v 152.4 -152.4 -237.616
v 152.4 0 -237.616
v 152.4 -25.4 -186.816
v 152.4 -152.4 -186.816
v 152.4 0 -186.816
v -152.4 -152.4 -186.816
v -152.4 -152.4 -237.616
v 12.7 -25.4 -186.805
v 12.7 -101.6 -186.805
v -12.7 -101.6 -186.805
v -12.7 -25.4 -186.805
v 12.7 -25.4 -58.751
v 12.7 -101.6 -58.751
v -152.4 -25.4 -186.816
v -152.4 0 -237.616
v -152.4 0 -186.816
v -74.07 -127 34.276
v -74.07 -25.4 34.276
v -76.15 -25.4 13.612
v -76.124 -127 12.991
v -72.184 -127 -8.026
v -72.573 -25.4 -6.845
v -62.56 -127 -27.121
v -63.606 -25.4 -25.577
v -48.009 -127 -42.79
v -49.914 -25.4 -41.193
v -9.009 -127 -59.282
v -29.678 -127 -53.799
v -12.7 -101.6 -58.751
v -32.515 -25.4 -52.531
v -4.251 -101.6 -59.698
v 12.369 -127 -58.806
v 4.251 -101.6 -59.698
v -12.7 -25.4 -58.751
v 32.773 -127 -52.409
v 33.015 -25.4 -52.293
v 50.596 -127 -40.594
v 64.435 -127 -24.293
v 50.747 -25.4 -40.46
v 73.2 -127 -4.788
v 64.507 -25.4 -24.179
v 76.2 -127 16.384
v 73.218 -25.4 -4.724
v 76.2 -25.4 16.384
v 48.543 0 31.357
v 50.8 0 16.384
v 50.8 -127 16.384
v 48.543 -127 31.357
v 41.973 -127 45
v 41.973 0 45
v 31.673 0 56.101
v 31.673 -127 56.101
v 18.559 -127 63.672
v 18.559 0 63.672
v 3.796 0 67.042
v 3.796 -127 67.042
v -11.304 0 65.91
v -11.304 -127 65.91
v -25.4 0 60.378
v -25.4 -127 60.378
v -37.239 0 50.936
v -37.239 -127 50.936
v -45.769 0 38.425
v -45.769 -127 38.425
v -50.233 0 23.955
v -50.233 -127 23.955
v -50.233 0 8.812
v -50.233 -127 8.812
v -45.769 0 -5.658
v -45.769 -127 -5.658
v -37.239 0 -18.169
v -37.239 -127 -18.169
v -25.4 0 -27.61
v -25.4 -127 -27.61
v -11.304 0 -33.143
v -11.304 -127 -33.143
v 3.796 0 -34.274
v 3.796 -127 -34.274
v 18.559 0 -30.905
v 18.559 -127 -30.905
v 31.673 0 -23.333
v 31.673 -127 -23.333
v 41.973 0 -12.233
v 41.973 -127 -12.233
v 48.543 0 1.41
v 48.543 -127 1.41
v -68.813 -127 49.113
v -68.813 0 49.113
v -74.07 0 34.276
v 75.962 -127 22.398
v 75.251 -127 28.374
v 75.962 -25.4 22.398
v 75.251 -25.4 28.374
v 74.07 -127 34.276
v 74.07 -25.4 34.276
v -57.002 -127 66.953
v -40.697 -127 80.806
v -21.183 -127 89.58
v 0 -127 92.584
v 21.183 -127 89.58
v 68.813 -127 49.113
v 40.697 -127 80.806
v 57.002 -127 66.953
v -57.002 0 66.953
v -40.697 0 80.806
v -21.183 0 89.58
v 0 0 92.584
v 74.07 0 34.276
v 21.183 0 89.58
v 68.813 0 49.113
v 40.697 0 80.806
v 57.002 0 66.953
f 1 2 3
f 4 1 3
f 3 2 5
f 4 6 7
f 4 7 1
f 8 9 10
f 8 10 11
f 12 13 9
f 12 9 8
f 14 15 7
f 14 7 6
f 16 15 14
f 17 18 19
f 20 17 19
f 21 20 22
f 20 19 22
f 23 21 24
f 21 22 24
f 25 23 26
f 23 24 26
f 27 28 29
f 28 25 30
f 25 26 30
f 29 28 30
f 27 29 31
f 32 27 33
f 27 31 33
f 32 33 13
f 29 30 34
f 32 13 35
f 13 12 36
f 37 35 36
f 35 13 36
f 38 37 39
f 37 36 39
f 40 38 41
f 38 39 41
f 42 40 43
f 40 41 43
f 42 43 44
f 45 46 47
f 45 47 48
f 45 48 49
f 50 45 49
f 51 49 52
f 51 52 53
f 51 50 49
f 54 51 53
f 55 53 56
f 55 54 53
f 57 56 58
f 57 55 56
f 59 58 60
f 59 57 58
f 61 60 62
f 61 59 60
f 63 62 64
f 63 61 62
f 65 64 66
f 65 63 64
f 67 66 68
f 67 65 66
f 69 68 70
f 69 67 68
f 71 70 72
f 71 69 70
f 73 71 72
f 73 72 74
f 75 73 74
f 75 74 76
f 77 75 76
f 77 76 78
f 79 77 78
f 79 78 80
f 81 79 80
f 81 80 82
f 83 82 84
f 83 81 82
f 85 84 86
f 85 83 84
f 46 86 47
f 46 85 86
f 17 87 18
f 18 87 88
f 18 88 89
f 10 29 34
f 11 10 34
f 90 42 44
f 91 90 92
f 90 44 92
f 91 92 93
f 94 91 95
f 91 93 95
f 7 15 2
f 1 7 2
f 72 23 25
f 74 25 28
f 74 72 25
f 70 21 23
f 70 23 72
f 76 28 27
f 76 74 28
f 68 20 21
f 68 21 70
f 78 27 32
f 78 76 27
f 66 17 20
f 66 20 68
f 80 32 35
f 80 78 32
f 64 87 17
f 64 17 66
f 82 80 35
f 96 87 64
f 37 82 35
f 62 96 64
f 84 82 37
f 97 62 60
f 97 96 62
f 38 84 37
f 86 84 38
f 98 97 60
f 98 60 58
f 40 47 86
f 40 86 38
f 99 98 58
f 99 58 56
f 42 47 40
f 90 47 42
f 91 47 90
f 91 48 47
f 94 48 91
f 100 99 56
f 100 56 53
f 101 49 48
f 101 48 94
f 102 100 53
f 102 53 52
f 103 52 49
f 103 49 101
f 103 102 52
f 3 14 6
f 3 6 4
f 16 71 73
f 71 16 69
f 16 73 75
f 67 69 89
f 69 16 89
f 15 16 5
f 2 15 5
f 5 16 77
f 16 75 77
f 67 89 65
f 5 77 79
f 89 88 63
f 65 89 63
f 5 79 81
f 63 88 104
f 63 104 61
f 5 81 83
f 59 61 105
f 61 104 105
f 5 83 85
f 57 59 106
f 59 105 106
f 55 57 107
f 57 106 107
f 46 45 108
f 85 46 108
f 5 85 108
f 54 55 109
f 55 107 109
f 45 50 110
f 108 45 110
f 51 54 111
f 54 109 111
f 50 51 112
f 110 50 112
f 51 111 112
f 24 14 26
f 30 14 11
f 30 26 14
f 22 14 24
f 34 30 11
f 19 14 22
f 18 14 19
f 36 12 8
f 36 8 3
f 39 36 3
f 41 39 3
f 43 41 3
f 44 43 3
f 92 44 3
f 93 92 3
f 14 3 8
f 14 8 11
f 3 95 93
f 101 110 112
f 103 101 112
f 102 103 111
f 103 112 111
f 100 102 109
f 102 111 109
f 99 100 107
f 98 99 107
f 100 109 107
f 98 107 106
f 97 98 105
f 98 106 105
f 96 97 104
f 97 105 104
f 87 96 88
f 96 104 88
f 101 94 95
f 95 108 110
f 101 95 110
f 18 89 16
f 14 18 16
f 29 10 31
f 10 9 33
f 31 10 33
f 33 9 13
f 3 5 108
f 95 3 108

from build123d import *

# Parameters (mm, degrees)
F1_DEPTH = 25.4
F0_W     = 304.8
F0_H     = 50.8
F2_DEPTH = 152.4
F0_R     = 50.8
F3_DEPTH = 127
F4_W     = 76.2
F4_H     = 139.571316
F5_DEPTH = 12.7


with BuildPart() as f1:
    # F0 (on Front) → F1 (new body)
    with BuildSketch(Plane.XZ):
        with BuildLine():
            Line((-74.069707, 34.275554), (-152.4, -186.816301))
            Line((-152.4, -186.816301), (152.4, -186.816301))
            Line((152.4, -186.816301), (74.069707, 34.275554))
            ThreePointArc((74.069707, 34.275554), (75.665553, 25.392814), (76.2, 16.383699))
            ThreePointArc((76.2, 16.383699), (-9.009115, -59.281853), (-74.069707, 34.275554))
        make_face()
    extrude(amount=F1_DEPTH)

    # F0 (on Front) → F2 (join)
    with BuildSketch(Plane.XZ):
        with Locations((0, -212.216301)):
            Rectangle(F0_W, F0_H)
    extrude(amount=F2_DEPTH)

    # F0 (on Front) → F3 (join)
    with BuildSketch(Plane.XZ):
        with BuildLine():
            Line((-68.812805, 49.11347), (-74.069707, 34.275554))
            ThreePointArc((-74.069707, 34.275554), (-9.009115, -59.281853), (76.2, 16.383699))
            ThreePointArc((76.2, 16.383699), (75.665553, 25.392814), (74.069707, 34.275554))
            Line((74.069707, 34.275554), (68.812805, 49.11347))
            ThreePointArc((68.812805, 49.11347), (0, 92.583699), (-68.812805, 49.11347))
        make_face()
        with Locations((0, 16.383699)):
            Circle(F0_R, mode=Mode.SUBTRACT)
    extrude(amount=F3_DEPTH)

    # F4 (on Right) → F5 (join, symmetric)
    with BuildSketch(Plane.YZ):
        with Locations((-63.5, -117.019369)):
            Rectangle(F4_W, F4_H)
    extrude(amount=F5_DEPTH, both=True)


solid = f1.part
